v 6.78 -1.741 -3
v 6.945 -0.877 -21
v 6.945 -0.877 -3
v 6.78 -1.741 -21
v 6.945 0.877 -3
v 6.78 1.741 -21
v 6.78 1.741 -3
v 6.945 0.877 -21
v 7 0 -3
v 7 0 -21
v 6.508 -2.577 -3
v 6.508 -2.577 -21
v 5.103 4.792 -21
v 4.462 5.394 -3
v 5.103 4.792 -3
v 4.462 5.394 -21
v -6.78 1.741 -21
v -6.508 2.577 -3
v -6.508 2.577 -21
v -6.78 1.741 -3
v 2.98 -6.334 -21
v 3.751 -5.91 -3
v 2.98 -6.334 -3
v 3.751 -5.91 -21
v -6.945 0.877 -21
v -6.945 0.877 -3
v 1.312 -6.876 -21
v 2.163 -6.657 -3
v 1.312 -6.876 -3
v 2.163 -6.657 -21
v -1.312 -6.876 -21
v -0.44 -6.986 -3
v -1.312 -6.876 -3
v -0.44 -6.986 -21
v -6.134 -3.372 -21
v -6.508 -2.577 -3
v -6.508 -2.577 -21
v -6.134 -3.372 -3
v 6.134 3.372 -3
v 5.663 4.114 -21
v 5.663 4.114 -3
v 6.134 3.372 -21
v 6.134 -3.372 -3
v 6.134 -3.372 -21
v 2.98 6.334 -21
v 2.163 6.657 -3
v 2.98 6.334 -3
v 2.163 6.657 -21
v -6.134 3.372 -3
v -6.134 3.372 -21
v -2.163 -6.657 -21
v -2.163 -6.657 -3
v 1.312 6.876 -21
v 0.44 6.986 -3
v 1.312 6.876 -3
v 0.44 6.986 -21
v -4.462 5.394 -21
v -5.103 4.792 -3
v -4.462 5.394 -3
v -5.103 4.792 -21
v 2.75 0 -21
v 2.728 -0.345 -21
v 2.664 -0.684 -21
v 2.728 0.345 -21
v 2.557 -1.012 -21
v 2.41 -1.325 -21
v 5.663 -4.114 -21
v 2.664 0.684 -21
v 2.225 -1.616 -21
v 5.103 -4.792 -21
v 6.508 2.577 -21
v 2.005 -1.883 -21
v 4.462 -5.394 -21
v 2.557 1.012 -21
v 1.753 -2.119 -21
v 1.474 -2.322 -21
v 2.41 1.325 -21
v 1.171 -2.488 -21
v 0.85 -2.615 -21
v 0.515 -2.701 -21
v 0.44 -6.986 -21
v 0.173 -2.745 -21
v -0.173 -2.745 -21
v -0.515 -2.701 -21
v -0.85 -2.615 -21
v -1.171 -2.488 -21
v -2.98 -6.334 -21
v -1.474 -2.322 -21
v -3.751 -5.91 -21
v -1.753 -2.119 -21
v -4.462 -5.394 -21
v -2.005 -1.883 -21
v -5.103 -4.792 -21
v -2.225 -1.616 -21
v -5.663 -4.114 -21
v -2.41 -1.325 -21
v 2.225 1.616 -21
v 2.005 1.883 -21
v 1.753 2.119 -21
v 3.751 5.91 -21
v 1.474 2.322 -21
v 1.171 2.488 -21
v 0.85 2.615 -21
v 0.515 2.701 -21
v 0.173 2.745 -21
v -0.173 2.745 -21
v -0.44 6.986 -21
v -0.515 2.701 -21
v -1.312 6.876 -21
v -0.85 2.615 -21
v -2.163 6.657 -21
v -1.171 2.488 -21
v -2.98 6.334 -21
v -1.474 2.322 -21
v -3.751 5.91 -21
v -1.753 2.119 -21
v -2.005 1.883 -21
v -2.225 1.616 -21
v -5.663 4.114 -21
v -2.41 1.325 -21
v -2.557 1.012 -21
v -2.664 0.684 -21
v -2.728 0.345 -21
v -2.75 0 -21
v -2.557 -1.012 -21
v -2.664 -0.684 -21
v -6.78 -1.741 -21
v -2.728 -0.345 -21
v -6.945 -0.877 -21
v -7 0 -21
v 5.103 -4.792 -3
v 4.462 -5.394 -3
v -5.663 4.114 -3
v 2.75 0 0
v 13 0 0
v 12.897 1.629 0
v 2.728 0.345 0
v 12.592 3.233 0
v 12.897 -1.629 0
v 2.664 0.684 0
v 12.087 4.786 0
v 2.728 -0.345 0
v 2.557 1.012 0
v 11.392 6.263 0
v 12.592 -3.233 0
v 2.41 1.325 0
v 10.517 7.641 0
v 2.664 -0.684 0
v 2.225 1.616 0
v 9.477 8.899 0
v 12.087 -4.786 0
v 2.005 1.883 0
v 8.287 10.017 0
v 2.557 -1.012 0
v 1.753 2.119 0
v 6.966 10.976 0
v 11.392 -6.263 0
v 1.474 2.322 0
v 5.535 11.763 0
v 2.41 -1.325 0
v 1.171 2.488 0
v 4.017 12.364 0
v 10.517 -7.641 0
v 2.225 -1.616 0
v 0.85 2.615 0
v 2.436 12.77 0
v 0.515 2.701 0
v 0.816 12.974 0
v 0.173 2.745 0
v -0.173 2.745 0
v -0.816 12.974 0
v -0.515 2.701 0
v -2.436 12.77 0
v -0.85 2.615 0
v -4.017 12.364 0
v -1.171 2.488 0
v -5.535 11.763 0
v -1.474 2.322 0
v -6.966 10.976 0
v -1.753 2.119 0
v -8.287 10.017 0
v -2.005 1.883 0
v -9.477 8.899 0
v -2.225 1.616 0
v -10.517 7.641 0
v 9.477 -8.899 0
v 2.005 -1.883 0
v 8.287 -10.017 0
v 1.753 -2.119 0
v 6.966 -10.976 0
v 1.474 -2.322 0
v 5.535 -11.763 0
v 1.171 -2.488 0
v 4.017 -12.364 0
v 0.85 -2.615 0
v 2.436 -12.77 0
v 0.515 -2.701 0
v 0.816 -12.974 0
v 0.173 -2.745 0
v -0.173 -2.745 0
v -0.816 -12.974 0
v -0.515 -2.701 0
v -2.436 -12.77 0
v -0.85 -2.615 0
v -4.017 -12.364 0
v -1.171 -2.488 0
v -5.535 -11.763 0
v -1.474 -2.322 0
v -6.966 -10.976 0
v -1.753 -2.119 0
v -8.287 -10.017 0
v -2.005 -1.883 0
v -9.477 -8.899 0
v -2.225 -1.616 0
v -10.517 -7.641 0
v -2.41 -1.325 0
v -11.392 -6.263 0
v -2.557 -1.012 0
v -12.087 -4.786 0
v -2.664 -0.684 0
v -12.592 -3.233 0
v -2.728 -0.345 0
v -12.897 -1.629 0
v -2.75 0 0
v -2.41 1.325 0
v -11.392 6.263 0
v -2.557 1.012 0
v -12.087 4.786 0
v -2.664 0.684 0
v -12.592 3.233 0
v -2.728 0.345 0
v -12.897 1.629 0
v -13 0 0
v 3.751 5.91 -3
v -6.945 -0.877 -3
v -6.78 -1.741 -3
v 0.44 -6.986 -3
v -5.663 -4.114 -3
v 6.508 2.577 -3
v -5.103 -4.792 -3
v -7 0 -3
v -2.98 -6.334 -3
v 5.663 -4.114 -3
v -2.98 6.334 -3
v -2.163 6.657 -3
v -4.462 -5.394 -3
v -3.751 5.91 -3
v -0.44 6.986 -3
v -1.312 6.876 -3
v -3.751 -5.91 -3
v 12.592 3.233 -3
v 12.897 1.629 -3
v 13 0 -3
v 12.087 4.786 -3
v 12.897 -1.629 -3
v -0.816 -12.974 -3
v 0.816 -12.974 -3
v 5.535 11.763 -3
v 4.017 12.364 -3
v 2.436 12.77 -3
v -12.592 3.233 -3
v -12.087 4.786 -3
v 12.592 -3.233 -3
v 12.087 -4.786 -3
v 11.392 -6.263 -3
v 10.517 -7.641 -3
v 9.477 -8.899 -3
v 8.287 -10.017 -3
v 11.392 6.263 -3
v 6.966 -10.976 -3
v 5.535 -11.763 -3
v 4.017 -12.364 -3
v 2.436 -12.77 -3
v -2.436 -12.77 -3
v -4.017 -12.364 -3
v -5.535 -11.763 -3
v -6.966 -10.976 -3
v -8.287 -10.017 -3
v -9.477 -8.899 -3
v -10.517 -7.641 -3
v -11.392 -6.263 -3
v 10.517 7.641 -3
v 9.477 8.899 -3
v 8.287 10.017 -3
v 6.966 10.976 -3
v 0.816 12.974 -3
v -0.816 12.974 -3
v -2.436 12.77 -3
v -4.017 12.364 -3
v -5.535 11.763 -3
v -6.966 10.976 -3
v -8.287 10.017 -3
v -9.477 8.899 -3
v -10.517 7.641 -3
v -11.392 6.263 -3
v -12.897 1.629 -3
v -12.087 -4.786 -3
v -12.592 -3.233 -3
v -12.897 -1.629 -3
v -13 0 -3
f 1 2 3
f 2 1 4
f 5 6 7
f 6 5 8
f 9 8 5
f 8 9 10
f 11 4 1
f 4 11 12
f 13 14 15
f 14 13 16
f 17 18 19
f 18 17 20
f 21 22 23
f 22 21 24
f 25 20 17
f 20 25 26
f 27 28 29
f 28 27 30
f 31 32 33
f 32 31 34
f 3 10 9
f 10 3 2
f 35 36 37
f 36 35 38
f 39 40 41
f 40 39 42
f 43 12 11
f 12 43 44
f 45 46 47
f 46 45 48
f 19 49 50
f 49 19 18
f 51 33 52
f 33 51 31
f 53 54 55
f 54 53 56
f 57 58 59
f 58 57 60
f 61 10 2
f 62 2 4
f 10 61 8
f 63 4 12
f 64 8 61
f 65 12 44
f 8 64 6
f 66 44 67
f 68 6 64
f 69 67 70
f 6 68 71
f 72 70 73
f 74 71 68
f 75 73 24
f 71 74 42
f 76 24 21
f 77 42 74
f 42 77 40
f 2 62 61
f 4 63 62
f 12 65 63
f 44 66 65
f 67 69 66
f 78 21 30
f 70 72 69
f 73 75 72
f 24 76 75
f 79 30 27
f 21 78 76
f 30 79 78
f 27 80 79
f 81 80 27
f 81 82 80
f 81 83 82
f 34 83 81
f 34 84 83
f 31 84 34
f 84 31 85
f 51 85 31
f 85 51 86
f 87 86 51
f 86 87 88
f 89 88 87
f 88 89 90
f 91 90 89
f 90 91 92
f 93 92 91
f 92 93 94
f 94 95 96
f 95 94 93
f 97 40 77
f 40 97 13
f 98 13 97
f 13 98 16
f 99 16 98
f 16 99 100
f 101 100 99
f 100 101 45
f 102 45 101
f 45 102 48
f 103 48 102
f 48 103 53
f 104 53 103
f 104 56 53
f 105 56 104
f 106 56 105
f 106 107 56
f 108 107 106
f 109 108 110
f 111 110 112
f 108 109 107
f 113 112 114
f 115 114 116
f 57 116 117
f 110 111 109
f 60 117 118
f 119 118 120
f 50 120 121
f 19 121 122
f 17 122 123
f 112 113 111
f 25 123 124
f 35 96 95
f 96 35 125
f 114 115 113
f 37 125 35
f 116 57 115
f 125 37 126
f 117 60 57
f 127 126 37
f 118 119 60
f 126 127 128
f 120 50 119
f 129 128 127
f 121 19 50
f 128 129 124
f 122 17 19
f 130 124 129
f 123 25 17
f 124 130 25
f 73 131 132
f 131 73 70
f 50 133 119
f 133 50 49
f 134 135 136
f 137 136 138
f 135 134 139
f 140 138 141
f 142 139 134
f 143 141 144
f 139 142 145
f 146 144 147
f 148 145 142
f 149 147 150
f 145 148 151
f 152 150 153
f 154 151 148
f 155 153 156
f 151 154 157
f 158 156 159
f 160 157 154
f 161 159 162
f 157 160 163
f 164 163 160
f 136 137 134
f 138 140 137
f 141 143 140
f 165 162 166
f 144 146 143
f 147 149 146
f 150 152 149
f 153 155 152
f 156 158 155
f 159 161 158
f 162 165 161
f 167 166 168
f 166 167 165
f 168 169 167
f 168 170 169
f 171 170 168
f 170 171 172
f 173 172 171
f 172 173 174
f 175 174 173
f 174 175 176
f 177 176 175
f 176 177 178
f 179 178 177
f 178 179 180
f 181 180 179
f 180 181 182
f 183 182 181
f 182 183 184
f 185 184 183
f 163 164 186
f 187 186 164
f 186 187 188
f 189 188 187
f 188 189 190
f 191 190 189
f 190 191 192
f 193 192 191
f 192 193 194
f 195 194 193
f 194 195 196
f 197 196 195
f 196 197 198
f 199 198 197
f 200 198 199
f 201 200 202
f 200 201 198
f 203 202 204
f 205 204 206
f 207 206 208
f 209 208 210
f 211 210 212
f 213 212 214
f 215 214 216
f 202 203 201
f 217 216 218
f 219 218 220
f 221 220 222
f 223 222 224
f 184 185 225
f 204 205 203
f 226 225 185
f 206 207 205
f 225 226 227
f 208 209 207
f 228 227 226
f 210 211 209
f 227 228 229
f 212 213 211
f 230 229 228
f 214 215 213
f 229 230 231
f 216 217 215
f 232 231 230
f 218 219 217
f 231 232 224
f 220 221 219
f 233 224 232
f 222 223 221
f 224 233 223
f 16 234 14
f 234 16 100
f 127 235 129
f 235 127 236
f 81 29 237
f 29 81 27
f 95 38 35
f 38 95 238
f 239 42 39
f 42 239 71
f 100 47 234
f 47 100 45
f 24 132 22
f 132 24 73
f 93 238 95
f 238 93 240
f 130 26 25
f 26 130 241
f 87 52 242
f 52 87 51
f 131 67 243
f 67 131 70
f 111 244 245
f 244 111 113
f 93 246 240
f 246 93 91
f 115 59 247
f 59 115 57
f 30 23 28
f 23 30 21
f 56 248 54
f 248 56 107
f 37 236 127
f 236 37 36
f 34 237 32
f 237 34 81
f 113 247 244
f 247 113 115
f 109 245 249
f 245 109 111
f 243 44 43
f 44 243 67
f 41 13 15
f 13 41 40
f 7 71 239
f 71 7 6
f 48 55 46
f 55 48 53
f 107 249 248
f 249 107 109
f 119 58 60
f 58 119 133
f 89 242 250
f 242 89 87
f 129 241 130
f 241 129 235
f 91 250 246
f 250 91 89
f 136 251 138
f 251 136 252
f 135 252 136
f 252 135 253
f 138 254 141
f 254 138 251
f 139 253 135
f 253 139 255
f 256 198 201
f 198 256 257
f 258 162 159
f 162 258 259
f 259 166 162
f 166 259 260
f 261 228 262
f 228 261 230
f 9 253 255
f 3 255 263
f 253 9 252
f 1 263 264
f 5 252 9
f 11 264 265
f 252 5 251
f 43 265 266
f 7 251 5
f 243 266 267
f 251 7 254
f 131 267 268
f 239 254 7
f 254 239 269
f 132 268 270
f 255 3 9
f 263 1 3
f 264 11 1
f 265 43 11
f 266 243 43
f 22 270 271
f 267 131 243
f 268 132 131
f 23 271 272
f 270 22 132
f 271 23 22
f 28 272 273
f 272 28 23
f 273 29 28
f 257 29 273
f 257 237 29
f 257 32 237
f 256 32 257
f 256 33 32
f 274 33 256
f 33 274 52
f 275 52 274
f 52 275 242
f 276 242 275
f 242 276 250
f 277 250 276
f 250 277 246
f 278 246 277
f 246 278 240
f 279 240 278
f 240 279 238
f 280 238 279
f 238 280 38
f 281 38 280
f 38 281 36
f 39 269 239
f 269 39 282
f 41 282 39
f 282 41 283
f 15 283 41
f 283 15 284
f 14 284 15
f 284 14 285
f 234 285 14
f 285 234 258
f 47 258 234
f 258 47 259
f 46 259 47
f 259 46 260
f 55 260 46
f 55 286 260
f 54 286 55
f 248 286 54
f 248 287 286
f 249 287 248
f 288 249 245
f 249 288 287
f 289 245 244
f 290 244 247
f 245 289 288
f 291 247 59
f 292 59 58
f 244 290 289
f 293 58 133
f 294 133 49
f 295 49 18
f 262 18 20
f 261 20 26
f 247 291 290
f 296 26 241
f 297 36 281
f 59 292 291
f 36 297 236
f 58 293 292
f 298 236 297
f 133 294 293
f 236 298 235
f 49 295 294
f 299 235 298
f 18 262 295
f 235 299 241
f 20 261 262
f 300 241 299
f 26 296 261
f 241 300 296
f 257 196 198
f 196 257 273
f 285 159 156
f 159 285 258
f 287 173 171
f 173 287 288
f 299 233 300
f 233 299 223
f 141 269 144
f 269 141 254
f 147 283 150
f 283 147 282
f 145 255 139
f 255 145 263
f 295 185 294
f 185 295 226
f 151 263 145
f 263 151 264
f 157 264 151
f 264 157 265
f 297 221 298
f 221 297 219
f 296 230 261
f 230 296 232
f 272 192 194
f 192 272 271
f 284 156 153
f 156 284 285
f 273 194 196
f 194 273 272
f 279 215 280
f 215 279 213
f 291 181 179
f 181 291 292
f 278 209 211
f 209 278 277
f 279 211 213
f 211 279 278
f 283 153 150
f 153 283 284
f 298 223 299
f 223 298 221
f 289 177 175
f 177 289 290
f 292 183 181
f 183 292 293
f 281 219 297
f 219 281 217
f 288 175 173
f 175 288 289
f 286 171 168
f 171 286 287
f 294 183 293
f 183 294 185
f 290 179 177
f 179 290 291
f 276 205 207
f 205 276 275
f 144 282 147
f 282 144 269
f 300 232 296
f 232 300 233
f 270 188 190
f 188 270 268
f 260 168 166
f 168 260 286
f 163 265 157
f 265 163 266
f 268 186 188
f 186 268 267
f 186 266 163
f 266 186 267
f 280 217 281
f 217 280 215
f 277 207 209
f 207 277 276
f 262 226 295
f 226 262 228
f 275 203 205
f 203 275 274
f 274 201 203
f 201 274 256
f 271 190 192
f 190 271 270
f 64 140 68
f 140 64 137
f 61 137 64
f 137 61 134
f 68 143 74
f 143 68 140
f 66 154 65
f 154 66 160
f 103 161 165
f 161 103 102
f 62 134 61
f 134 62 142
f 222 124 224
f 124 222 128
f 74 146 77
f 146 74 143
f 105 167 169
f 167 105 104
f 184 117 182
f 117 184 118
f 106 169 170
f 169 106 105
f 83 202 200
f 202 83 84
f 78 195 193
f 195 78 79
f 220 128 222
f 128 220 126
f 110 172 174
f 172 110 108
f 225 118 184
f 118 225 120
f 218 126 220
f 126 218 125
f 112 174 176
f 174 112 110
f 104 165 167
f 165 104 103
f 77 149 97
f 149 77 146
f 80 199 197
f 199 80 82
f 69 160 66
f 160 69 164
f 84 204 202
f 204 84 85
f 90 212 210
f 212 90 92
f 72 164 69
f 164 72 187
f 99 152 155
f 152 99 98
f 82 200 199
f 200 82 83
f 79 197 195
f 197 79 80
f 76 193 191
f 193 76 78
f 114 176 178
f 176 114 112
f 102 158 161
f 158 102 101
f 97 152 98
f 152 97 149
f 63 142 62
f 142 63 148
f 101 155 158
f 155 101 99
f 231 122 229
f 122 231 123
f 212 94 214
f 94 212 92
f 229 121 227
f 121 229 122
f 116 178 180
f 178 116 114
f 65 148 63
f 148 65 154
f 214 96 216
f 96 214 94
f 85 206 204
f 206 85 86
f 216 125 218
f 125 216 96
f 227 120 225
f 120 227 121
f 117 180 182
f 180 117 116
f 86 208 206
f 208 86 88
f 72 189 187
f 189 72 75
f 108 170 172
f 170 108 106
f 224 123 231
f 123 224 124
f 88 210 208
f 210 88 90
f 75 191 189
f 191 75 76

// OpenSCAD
$fn = 50;


difference() {
	union() {
		translate(v = [0, 0, -21.0000000000]) {
			cylinder(h = 21, r = 7.0000000000);
		}
		translate(v = [0, 0, -3.0000000000]) {
			cylinder(h = 3, r = 13.0000000000);
		}
	}
	union() {
		#translate(v = [0, 0, -21]) {
			cylinder(h = 21, r = 2.7500000000);
		}
	}
}
